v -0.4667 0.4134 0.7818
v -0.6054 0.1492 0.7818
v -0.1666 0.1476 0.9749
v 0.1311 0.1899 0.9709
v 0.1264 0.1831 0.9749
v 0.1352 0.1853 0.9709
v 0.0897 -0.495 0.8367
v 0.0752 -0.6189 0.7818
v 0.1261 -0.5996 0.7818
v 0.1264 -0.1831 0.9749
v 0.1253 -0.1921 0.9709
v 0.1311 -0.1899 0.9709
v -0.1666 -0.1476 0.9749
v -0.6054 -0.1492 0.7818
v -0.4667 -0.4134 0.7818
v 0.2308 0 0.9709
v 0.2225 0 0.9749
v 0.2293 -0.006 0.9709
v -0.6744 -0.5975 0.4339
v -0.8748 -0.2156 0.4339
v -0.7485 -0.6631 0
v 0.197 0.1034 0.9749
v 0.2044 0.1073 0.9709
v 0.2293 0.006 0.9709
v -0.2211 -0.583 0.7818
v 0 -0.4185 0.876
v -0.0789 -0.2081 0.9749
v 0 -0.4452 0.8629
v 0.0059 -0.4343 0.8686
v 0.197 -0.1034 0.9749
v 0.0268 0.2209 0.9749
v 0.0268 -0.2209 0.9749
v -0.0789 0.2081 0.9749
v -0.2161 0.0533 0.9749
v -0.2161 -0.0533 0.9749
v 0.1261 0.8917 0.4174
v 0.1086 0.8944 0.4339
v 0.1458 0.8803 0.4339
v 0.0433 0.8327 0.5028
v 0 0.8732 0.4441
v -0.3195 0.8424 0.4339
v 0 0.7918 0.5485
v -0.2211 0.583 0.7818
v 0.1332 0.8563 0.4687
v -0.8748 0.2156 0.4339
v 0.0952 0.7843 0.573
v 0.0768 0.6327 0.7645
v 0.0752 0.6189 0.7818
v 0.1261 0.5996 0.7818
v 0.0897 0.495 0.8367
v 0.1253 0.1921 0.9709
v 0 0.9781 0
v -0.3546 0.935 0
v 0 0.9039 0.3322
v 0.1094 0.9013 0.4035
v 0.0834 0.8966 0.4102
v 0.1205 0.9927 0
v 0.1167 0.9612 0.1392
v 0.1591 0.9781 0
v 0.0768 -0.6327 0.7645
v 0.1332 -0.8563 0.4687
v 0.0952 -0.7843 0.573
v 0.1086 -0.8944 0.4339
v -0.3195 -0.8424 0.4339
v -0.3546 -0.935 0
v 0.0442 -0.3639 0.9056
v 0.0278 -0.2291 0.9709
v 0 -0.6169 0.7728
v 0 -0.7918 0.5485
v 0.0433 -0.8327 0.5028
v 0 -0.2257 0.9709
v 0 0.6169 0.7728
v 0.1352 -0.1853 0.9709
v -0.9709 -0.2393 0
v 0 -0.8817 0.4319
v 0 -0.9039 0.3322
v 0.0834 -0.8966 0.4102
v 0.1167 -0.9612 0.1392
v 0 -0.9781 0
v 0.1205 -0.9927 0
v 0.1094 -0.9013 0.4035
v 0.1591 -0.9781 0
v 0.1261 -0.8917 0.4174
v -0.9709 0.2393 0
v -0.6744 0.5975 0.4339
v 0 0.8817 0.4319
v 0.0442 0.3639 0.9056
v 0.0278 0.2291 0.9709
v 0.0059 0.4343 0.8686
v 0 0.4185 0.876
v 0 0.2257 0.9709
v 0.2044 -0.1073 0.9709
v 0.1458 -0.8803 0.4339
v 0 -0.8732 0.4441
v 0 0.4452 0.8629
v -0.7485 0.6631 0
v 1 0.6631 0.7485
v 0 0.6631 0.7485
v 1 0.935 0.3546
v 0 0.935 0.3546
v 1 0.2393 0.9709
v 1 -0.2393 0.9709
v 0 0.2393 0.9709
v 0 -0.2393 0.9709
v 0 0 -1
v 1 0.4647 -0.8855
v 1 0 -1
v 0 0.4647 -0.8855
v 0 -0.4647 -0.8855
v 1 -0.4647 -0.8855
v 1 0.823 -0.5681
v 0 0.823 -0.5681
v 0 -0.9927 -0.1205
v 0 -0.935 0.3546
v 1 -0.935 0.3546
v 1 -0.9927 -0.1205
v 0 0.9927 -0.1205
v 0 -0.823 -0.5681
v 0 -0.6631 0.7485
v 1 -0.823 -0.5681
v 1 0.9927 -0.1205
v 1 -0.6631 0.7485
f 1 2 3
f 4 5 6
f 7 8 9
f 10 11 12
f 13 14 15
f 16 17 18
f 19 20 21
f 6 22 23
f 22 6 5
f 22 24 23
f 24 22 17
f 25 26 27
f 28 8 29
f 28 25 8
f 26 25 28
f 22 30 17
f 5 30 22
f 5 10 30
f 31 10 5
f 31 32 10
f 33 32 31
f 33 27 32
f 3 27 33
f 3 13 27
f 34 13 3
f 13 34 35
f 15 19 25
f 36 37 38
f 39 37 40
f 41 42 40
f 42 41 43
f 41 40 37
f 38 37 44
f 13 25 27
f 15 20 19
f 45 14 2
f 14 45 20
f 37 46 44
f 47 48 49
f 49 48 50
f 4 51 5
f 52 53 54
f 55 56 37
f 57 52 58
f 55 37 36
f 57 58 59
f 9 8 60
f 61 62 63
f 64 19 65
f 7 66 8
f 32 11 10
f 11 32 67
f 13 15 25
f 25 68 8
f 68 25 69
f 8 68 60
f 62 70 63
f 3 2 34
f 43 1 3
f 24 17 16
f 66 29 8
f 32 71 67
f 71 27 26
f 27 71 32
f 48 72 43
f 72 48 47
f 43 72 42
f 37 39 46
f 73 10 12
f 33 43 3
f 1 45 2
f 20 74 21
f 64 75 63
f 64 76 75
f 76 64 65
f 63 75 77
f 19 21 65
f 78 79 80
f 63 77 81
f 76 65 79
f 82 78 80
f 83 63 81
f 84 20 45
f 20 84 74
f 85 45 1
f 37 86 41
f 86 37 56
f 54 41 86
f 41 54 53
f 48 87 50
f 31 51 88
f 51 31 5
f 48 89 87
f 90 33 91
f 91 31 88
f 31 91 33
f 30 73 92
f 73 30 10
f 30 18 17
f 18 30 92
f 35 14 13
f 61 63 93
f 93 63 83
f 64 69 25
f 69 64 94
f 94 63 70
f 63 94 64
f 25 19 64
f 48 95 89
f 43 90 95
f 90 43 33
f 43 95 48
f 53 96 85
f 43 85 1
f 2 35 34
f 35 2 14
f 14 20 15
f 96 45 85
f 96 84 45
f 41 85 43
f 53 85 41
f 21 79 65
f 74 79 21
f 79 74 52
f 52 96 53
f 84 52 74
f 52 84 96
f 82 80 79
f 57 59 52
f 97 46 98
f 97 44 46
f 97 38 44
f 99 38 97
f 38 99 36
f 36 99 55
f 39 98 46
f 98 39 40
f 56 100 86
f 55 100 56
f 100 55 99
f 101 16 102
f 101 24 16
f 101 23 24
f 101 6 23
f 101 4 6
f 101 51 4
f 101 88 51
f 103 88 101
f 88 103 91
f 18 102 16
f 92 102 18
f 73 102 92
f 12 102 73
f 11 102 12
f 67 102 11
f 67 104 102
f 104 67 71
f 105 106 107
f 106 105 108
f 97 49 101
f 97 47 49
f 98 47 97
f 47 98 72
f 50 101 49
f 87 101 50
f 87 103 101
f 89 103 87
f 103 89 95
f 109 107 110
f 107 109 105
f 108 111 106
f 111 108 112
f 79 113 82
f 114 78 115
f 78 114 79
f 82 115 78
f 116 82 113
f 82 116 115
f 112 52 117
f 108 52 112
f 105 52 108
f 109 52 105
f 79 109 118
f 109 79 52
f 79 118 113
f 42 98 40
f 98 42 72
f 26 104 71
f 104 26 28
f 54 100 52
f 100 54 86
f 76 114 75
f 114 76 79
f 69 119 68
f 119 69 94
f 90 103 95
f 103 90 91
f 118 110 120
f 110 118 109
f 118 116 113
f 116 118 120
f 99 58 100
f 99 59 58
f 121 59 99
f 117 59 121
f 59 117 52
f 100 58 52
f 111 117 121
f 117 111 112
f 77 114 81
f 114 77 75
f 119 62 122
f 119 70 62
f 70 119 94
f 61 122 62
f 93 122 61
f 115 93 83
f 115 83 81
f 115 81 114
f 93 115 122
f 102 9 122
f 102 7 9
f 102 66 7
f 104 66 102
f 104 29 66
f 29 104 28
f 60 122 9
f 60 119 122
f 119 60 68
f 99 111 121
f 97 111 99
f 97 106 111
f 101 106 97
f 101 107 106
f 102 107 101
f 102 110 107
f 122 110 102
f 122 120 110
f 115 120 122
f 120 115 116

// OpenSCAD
$fs = 0.5;
$fa = 5;
fname = "SEKISOU3.DXF";
colour = [0.95, 0.95, 1, 0.4];
// Extract values from DXF
base01 = dxf_cross(file=fname, layer="base01");
base02 = dxf_cross(file=fname, layer="base02");
base03 = dxf_cross(file=fname, layer="base03");
base04 = dxf_cross(file=fname, layer="base04");
base05 = dxf_cross(file=fname, layer="base05");
base06 = dxf_cross(file=fname, layer="base06");
base11 = dxf_cross(file=fname, layer="base11");
base12 = dxf_cross(file=fname, layer="base12");
base13 = dxf_cross(file=fname, layer="base13");
base14 = dxf_cross(file=fname, layer="base14");

L01     = dxf_dim(file=fname, layer="dims", name="L01");
L02     = dxf_dim(file=fname, layer="dims", name="L02");
L03     = dxf_dim(file=fname, layer="dims", name="L03");
L04     = dxf_dim(file=fname, layer="dims", name="L04");
L05     = dxf_dim(file=fname, layer="dims", name="L05");
L06     = dxf_dim(file=fname, layer="dims", name="L06");
L11     = dxf_dim(file=fname, layer="dims", name="L11");
L12     = dxf_dim(file=fname, layer="dims", name="L12");
L13     = dxf_dim(file=fname, layer="dims", name="L13");
L14     = dxf_dim(file=fname, layer="dims", name="L14");

echo("L01",L01);
echo("L02",L02);
echo("L03",L03);
echo("L04",L04);
echo("L05",L05);
echo("L06",L06);
echo("L11",L11);
echo("L12",L12);
echo("L13",L13);
echo("L14",L14);

move01	= [0, 0, 0];
move02  = [0, 0, L01];
move03  = [0, 0, L01+L02];
move04  = [0, 0, 0];
move05	= [0, 0, 0];
move06  = [0, 0, 0];
move11  = [0, L11/2, 0];
move12  = [0, 0, 0];
move13  = [0, 0, 0];
move14  = [0, 0, 0];
union(){
    intersection(){
        union() {
            place_panel("panel01", base01, [0, 0, 0], move01,L01);
            place_panel("panel02", base02, [0, 0, 0], move02,L02);
            place_panel("panel03", base03, [0, 0, 0], move03,L03);
        }
        place_panel("panel11", base11, [1, 0, 0], move11,L11);
        place_panel("panel12", base12, [0, 1, 0], move12,L12);
    }
    difference() {
        translate ([0,0,L04])sphere(r = L13);
        translate ([-10,-10,-20])cube(size = [20, 20, 20], center = false);
    }
    translate ([0,0,L04])rotate([0, 90, 0])cylinder(h=L06, r=L05, center=false);
}

//
module place_panel(side, origin, rotation, location, thickness ) {
	translate (location)
		rotate (90, rotation)
			linear_extrude(file=fname, layer=side, height=thickness, convexity=10, origin=origin);
}
